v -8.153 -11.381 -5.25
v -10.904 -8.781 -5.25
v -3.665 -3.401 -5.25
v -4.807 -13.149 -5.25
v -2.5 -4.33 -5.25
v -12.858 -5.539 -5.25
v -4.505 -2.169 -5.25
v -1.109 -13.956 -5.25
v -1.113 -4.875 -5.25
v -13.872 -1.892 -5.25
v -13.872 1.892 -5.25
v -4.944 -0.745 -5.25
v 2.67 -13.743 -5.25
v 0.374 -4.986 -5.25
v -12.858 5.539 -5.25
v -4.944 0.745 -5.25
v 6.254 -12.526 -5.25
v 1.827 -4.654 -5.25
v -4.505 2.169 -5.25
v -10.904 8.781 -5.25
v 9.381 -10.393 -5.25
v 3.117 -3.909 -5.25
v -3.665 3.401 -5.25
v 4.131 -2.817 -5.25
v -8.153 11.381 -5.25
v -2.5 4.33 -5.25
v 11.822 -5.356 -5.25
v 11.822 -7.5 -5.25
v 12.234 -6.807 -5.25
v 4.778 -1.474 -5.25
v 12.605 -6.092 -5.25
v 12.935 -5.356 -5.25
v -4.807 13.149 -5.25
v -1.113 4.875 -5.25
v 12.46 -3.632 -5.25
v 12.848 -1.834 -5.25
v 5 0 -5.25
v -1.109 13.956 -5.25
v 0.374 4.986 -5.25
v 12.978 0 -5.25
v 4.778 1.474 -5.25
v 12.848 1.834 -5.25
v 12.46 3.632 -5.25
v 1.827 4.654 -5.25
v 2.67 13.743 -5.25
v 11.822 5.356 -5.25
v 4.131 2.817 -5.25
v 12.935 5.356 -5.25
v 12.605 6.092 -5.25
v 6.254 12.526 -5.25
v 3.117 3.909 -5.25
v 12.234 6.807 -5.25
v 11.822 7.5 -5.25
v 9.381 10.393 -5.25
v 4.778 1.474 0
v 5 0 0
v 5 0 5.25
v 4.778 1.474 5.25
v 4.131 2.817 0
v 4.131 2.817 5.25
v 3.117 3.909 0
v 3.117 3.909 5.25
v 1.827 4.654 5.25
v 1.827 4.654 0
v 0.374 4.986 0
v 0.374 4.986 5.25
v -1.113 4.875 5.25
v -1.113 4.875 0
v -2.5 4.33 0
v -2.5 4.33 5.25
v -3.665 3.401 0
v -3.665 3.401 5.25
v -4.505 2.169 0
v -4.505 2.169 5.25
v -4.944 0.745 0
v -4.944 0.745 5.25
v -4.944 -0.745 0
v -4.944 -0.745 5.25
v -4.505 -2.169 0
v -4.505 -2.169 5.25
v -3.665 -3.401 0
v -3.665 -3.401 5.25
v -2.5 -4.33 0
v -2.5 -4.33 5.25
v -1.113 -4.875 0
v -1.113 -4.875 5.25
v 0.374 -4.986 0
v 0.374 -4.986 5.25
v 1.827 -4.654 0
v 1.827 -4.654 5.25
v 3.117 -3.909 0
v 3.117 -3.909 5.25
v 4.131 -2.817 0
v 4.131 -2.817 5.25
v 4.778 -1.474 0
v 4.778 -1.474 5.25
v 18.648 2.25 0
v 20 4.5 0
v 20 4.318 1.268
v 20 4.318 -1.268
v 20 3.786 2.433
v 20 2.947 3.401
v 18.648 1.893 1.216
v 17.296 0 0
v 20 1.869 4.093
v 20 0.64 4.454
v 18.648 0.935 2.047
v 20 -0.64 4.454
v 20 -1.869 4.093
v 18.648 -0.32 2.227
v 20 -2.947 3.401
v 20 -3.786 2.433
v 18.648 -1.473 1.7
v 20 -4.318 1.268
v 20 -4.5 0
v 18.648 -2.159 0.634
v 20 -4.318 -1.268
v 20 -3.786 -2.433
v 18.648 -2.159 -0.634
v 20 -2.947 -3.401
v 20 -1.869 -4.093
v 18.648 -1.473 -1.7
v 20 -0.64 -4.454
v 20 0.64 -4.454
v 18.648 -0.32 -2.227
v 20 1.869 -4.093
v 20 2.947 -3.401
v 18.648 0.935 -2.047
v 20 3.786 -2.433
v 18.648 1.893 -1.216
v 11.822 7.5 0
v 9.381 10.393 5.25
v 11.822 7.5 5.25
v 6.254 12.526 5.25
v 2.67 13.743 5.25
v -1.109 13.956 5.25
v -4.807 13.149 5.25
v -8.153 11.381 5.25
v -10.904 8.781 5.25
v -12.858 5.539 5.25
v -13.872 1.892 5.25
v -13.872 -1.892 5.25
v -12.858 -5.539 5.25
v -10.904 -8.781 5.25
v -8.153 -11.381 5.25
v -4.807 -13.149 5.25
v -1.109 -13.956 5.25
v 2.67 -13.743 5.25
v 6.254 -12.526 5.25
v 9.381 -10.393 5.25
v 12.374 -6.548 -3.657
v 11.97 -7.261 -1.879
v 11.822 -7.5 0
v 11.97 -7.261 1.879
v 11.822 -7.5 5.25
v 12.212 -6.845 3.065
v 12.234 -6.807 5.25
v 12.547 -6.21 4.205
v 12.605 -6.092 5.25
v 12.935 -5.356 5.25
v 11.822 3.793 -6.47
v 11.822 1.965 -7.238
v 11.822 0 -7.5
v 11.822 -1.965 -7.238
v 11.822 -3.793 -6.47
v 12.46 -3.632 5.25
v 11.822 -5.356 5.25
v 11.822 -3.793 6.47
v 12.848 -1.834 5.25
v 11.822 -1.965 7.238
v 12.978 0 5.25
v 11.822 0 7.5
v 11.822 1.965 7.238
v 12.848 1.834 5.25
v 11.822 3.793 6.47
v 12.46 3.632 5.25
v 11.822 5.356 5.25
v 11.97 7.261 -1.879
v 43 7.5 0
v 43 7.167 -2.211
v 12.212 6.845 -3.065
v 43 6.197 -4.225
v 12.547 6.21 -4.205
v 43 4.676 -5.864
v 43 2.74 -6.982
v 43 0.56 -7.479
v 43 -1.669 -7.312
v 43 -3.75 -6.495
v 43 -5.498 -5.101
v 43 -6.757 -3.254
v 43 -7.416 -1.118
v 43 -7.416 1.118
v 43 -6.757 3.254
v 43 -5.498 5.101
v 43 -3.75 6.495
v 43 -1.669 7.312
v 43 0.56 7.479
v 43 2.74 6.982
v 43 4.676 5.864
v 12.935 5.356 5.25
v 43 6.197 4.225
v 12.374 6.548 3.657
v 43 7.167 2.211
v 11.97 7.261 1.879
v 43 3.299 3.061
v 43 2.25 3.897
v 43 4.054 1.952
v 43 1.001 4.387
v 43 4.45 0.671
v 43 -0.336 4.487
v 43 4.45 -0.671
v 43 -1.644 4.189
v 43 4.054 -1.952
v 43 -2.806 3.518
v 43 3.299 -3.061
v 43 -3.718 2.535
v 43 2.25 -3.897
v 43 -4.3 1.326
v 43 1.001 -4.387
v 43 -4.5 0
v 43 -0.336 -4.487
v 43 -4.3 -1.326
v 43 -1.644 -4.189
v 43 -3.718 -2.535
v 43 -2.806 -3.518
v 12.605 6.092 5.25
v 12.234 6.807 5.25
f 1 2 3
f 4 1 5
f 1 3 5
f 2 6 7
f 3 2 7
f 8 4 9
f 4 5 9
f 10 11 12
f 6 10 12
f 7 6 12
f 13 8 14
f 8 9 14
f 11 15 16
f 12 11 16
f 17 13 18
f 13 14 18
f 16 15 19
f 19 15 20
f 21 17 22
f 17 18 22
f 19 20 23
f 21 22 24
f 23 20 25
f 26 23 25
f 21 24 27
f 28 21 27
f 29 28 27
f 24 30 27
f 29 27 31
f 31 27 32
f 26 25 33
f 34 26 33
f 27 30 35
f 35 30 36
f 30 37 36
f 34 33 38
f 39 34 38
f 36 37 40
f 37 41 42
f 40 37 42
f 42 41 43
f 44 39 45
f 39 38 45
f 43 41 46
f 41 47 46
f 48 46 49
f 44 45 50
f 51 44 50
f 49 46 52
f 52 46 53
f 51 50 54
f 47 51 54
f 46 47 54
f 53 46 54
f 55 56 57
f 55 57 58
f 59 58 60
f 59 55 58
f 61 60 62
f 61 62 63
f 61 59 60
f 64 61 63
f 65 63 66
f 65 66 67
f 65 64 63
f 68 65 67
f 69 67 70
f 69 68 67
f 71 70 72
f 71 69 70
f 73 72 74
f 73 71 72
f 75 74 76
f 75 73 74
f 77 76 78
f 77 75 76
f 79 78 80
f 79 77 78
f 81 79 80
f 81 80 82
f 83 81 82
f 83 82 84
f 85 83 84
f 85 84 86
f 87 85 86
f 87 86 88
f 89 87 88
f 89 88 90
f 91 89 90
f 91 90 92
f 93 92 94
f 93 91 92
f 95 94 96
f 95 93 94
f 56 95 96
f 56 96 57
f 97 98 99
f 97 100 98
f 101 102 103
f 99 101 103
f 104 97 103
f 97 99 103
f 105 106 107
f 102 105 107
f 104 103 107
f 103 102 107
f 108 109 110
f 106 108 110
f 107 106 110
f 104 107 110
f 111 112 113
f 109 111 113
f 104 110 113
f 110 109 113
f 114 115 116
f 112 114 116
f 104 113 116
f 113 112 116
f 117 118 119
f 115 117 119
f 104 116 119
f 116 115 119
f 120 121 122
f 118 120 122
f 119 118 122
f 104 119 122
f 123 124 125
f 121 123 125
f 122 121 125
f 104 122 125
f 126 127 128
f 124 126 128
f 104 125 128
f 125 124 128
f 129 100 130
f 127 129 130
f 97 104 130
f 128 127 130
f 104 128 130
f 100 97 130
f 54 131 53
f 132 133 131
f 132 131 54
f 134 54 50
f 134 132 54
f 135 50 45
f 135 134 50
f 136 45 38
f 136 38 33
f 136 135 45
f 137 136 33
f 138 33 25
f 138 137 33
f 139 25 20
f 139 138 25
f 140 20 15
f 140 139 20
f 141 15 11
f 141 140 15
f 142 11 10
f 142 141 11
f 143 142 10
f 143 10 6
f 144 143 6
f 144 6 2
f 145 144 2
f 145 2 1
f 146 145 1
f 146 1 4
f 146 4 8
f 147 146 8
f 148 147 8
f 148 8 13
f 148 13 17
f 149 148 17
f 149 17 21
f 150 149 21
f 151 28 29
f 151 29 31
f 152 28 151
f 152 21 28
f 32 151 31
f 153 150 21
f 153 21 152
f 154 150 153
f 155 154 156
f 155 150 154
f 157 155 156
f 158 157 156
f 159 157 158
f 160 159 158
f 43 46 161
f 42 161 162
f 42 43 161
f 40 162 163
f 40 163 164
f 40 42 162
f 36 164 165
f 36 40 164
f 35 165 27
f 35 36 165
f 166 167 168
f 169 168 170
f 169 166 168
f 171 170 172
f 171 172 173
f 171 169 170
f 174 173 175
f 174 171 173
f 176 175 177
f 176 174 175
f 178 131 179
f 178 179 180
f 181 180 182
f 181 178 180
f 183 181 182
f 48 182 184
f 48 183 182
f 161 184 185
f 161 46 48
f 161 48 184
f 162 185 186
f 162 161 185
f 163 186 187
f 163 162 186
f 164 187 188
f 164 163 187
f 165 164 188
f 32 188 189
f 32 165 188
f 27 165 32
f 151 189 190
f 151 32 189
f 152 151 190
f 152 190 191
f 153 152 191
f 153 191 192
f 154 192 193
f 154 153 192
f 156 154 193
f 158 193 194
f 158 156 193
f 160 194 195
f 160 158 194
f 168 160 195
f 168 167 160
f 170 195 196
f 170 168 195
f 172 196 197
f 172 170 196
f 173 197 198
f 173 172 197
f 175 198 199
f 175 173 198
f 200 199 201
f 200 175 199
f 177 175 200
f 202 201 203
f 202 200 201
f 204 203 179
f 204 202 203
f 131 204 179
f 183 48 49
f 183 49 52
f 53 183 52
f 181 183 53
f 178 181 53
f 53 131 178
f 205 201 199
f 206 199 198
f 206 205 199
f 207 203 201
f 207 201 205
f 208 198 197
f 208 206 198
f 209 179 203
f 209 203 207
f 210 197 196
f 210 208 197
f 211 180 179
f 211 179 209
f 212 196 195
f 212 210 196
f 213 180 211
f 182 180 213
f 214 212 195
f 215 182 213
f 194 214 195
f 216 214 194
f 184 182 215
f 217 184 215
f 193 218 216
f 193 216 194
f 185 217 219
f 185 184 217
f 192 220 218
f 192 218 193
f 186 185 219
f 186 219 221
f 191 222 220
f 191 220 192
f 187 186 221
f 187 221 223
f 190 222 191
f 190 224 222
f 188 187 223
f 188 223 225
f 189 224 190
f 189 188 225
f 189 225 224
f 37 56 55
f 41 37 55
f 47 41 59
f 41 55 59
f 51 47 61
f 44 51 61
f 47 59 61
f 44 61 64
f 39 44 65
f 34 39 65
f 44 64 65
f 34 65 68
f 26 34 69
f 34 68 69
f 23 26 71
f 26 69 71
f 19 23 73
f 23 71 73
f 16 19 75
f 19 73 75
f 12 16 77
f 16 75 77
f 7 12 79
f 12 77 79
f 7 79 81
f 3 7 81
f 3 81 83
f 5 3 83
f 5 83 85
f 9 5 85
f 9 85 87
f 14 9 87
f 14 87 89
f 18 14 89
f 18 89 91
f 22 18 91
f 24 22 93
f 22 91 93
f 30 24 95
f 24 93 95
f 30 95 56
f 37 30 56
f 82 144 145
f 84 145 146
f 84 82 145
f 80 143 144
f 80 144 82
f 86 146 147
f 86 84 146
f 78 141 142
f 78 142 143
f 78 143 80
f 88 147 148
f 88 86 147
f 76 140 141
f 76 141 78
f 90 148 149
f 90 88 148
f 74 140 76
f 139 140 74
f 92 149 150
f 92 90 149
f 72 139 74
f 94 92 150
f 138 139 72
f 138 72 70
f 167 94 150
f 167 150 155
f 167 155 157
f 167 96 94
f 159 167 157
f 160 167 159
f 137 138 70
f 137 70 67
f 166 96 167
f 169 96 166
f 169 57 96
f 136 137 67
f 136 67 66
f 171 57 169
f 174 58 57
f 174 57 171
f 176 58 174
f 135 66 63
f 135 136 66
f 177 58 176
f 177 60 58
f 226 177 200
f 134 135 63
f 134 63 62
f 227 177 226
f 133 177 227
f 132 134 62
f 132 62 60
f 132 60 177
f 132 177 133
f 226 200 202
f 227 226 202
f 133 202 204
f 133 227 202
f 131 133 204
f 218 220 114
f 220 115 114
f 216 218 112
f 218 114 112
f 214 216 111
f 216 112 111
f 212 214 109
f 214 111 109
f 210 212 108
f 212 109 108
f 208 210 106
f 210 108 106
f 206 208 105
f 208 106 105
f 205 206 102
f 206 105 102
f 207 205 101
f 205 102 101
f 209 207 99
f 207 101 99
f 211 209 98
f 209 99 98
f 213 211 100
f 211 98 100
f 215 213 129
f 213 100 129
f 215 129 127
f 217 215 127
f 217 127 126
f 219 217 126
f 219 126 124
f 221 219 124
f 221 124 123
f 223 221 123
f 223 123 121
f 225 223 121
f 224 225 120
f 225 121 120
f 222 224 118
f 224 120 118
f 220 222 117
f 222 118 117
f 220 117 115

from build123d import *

# Parameters (mm, degrees)
F0_R     = 5
F1_DEPTH = 5.25
F4_D     = 9
F4_DEPTH = 23
F4_TIP   = 2.7038727856


with BuildPart() as f1:
    # F0 (on Top) → F1 (new body, symmetric)
    with BuildSketch(Plane.XY):
        with BuildLine():
            ThreePointArc((11.8215904175, -7.5), (13.4443717935, -3.9049797794), (14, 0))
            ThreePointArc((14, 0), (13.4443717935, 3.9049797794), (11.8215904175, 7.5))
            ThreePointArc((11.8215904175, 7.5), (-14, 0), (11.8215904175, -7.5))
        make_face()
        Circle(F0_R, mode=Mode.SUBTRACT)
    extrude(amount=F1_DEPTH, both=True)

    # F0 (on Top) → F2 (revolve)
    with BuildSketch(Plane.XY):
        with BuildLine():
            ThreePointArc((11.8215904175, 7.5), (13.4443717935, 3.9049797794), (14, 0))
            Line((14, 0), (43, 0))
            Line((43, 0), (43, 7.5))
            Line((43, 7.5), (11.8215904175, 7.5))
        make_face()
    revolve(axis=Axis((18.6075619422, 0, 0), (-1, 0, 0)))

    # F4
    with Locations(Plane.YZ.offset(43)):
        with Locations((0, 0)):
            Hole(F4_D / 2, depth=F4_DEPTH)
            with Locations((0, 0, -(F4_DEPTH + F4_TIP / 2))):  # 118° drill point
                Cone(0, F4_D / 2, F4_TIP, mode=Mode.SUBTRACT)


solid = f1.part
